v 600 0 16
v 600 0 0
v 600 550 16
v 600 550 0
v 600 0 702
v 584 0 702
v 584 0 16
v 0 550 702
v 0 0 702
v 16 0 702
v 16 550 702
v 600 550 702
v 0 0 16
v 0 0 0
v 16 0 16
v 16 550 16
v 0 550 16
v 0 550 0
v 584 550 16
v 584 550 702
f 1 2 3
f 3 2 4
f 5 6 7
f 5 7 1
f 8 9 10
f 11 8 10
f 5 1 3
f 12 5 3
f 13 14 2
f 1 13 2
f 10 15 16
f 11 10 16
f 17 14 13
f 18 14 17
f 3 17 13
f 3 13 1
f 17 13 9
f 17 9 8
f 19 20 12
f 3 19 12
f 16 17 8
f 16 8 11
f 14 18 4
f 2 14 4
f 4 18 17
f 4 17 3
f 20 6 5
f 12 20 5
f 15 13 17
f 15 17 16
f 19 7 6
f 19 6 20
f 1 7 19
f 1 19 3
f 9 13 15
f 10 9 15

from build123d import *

# Parameters (mm, degrees)
F0_W     = 600
F0_H     = 550
F1_DEPTH = 16
F2_W     = 16
F2_H     = 550
F3_DEPTH = 686
F4_W     = 16
F4_H     = 550
F5_DEPTH = 686


with BuildPart() as f1:
    # F0 (on Top) → F1 (new body)
    with BuildSketch(Plane.XY):
        with Locations((300, 275)):
            Rectangle(F0_W, F0_H)
    extrude(amount=F1_DEPTH)


with BuildPart() as f3:
    # F2 (on face) → F3 (new body)
    with BuildSketch(Plane.XY.offset(16)):
        with Locations((8, 275)):
            Rectangle(F2_W, F2_H)
    extrude(amount=F3_DEPTH)


with BuildPart() as f5:
    # F4 (on face) → F5 (new body)
    with BuildSketch(Plane.XY.offset(16)):
        with Locations((592, 275)):
            Rectangle(F4_W, F4_H)
    extrude(amount=F5_DEPTH)


solid = Compound([f1.part, f3.part, f5.part])
